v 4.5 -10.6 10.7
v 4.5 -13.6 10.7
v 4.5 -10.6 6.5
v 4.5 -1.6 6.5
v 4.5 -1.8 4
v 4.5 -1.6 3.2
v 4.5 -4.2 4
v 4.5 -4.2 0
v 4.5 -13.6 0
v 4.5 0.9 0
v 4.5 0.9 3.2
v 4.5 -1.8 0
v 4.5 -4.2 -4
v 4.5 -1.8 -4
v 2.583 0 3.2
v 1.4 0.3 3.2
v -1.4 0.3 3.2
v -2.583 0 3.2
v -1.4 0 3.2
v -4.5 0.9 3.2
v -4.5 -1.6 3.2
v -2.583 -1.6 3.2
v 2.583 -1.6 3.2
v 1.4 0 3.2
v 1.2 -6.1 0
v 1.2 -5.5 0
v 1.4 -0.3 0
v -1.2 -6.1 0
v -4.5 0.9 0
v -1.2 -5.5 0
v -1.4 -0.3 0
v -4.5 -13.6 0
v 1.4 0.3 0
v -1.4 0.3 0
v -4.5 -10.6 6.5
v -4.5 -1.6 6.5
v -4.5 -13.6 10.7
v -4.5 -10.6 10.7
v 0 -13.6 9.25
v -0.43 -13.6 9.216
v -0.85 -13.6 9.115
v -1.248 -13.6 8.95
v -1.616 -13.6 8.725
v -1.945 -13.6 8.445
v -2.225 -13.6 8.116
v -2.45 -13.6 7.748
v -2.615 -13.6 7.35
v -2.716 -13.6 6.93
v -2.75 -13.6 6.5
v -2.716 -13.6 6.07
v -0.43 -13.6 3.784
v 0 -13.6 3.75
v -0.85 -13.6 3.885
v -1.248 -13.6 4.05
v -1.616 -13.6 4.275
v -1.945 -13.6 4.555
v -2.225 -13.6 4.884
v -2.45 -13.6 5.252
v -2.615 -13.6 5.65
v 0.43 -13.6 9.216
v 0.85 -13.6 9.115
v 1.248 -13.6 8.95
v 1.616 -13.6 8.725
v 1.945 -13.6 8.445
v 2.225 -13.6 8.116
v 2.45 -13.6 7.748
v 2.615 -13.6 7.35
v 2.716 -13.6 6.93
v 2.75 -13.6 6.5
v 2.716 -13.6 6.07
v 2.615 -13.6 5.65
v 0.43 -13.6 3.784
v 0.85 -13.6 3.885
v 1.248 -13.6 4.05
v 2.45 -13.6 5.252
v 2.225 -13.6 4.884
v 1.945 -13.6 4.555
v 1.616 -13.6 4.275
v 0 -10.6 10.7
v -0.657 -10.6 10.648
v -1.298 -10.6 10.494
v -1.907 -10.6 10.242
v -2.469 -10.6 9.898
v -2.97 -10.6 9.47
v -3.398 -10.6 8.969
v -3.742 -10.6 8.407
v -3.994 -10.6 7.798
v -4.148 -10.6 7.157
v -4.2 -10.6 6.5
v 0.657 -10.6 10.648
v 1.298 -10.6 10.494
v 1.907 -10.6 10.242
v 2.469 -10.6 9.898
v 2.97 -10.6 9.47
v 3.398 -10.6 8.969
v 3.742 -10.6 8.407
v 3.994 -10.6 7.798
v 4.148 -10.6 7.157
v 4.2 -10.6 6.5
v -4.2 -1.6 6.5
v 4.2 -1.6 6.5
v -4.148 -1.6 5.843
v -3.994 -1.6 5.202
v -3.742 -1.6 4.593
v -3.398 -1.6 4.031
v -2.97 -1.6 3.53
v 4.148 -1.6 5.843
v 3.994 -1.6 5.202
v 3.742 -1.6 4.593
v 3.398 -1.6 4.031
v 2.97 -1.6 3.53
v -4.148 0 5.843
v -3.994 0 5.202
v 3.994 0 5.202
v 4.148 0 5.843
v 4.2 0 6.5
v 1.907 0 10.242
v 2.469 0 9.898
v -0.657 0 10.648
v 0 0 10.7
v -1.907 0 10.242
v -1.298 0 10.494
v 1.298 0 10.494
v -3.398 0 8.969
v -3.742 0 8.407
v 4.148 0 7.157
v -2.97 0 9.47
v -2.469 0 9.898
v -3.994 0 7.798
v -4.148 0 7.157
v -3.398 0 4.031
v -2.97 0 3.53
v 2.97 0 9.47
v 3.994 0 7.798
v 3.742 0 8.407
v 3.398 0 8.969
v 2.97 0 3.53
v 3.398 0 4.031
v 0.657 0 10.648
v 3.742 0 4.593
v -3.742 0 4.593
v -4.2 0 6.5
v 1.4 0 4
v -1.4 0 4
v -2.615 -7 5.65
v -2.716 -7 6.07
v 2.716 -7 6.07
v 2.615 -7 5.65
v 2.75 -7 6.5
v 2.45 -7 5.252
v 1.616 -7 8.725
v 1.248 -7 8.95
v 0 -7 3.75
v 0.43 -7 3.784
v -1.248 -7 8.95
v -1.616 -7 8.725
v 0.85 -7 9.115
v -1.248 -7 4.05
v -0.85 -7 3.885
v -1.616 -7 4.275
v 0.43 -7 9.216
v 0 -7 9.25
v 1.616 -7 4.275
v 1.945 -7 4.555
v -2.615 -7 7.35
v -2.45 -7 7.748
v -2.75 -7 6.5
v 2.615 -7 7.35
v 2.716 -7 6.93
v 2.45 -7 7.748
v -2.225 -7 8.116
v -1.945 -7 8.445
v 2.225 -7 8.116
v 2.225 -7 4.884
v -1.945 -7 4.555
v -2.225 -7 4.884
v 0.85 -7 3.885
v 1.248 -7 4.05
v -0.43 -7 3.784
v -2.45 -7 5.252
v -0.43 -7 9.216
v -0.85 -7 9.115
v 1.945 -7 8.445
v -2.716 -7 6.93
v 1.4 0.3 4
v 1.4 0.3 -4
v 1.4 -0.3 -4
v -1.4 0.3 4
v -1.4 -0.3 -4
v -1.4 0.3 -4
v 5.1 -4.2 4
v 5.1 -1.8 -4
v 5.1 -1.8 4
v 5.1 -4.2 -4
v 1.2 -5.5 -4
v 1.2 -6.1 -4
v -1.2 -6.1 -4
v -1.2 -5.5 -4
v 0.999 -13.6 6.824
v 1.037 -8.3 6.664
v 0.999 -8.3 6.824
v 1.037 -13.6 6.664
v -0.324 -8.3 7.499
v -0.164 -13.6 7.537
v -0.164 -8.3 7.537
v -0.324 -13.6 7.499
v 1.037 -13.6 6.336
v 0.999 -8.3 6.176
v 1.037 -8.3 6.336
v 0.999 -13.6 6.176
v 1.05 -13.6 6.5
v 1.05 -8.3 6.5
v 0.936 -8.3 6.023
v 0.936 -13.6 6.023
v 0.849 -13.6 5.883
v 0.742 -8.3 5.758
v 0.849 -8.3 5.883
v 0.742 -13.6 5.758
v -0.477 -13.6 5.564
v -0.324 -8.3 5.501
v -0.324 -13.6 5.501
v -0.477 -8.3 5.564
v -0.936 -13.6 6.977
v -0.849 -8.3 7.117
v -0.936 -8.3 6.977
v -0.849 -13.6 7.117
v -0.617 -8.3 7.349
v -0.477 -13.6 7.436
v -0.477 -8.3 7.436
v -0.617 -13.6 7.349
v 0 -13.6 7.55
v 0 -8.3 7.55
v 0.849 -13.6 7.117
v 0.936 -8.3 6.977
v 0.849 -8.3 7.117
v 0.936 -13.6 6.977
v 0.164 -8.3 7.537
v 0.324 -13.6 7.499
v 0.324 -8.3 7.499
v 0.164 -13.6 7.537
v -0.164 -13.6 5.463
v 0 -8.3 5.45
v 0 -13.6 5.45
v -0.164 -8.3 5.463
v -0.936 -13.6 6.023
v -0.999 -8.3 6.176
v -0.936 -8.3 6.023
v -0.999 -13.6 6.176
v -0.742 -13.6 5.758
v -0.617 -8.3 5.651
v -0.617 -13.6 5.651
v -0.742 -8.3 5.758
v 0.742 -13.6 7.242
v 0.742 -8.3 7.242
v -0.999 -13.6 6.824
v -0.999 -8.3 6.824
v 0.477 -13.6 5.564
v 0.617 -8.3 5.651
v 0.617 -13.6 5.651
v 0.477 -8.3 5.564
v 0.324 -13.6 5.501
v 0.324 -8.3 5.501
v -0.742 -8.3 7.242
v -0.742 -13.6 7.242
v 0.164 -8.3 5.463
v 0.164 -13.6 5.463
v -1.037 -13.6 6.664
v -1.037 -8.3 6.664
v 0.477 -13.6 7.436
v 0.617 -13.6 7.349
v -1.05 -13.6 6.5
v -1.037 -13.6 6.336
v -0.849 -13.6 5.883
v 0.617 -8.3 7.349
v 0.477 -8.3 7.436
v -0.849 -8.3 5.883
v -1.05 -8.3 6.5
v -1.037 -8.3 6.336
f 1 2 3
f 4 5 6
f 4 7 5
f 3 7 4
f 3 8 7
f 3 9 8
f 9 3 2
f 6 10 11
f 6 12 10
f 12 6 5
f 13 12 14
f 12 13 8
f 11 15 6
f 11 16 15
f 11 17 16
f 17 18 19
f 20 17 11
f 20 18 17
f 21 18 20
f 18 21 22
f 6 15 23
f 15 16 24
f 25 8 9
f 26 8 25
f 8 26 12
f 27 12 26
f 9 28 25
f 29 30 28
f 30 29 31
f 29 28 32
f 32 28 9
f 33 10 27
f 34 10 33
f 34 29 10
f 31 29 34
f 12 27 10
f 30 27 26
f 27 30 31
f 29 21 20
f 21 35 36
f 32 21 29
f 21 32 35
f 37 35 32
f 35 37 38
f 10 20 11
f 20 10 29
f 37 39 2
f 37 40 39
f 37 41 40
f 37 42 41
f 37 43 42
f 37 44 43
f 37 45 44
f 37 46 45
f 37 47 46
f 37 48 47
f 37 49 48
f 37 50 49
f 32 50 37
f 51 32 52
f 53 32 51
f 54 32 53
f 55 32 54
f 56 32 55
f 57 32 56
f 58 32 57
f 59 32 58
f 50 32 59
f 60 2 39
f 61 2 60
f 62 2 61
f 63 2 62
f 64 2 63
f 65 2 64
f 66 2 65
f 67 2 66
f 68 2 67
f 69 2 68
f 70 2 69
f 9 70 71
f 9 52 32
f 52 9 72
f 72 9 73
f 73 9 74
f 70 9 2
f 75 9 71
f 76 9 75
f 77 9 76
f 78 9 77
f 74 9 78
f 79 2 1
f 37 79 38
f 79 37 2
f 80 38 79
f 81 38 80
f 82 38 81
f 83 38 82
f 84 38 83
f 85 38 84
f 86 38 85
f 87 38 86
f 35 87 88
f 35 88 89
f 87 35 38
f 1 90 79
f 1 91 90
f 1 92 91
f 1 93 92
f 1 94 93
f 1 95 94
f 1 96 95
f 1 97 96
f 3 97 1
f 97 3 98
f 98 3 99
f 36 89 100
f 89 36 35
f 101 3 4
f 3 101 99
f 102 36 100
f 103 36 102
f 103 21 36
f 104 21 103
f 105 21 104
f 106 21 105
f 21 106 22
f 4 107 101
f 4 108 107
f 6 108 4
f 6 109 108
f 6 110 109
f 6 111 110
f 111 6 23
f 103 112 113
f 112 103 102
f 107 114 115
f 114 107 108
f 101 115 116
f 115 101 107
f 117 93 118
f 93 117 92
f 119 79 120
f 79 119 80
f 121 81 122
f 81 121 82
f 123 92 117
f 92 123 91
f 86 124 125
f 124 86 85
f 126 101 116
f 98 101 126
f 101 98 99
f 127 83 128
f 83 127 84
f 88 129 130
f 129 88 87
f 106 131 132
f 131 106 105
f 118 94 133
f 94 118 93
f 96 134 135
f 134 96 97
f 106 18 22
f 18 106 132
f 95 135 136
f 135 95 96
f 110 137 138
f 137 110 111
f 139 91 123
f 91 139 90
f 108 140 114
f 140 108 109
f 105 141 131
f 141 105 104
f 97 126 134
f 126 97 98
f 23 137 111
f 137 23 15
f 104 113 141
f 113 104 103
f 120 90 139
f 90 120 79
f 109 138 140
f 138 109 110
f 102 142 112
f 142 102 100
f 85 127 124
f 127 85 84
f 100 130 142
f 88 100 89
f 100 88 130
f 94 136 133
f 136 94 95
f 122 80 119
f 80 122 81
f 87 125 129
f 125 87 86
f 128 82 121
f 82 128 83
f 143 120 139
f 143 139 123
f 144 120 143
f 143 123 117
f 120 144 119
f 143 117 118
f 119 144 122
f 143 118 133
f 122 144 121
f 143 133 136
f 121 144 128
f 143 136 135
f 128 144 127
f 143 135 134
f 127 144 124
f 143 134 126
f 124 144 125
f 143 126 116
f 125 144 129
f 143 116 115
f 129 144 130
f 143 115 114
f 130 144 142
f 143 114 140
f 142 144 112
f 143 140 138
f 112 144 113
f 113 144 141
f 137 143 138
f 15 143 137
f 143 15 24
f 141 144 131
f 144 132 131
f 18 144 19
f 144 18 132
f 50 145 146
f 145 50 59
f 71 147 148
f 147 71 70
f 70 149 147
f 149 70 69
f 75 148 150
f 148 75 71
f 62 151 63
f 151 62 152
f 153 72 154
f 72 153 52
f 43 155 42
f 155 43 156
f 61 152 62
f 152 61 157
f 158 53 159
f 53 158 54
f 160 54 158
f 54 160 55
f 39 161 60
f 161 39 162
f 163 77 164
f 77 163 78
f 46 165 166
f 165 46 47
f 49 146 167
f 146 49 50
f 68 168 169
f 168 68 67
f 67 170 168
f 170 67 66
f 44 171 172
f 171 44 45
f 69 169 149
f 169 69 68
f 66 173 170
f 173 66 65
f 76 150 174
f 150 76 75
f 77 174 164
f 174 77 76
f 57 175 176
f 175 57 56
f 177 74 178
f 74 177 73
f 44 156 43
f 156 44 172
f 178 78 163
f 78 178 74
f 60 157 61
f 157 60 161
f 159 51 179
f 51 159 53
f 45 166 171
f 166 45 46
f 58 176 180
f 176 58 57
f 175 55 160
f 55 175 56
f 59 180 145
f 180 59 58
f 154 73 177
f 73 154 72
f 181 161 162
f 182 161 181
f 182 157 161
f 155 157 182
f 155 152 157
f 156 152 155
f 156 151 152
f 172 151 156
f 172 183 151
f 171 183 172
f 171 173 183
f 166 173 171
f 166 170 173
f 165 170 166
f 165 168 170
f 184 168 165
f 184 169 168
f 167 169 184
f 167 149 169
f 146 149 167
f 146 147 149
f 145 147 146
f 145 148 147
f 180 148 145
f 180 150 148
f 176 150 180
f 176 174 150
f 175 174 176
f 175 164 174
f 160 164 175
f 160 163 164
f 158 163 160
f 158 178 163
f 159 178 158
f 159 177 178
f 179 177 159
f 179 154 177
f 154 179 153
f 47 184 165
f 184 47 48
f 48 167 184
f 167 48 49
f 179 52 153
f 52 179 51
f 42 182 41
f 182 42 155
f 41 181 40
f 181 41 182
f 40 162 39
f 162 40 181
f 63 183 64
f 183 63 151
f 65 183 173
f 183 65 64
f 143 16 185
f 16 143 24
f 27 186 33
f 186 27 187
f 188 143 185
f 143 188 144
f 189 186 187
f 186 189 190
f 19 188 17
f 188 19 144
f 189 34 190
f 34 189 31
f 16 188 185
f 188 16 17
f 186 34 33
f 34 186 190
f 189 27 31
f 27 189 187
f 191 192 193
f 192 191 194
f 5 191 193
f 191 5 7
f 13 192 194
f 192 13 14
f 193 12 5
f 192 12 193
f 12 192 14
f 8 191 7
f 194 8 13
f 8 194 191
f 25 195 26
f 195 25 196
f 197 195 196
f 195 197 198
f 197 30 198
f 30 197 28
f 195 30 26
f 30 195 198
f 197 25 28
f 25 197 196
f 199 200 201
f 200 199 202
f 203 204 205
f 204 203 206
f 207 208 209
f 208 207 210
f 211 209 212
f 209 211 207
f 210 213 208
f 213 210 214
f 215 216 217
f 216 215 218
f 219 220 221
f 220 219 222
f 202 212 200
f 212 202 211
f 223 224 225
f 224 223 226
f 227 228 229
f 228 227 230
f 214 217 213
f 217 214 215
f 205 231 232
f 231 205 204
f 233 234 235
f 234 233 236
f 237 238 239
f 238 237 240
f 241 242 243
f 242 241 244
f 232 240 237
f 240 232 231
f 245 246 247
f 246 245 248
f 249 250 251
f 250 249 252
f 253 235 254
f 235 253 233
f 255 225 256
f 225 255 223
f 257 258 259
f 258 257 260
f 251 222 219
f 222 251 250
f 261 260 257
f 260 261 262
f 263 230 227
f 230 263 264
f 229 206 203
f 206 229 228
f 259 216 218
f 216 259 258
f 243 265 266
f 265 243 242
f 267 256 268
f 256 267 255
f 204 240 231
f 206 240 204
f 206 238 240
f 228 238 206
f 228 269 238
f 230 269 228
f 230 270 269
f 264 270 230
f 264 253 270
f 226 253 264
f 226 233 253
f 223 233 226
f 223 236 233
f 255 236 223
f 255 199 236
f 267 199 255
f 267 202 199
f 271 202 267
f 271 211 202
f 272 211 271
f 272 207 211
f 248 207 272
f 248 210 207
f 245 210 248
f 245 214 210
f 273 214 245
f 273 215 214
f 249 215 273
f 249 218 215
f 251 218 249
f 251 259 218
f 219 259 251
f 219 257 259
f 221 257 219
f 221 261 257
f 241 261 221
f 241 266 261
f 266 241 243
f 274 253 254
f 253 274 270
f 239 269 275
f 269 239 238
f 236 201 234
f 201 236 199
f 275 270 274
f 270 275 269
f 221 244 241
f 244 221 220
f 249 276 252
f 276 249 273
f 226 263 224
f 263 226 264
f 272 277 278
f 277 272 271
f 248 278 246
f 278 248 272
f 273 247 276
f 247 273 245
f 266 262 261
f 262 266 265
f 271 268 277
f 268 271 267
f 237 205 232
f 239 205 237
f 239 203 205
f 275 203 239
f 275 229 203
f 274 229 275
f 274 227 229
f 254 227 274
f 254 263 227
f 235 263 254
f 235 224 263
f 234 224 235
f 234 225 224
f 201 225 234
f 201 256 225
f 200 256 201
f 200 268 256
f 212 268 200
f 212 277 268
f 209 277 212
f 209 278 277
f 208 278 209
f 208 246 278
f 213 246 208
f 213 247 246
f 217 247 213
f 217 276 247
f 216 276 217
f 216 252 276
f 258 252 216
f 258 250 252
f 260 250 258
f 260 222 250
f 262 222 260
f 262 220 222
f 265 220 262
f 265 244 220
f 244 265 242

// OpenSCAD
$fn=40;

black = [0.2,0.2,0.2];
silver = [0.75,0.75,0.75];

module pin(pos, size)
{
    translate(pos) cube(concat(size,8), center=true);
}

module legs()
{
	// The model is centered on the back pin
	pin([  0,  0],   [2.8, 0.6]);
	pin([4.8, -3],   [0.6, 2.4]);
	pin([  0, -5.8], [2.4, 0.6]);
}
	
module body()
{
    translate([-4.5, -13.6, 0])
	cube([9, 14.5, 3.2]);
    translate([-4.5, -13.6, 0])
	cube([9, 3, 10.7]);
    translate([-4.5, -13.6, 0])
	cube([9, 12, 6.5]);
    translate([0, -13.6, 6.5]) rotate([-90,0,0])
	cylinder(13.6, d=8.4);
}

module hole()
{
    translate([0, -14, 6.5]) rotate([-90,0,0])
	cylinder(7, d=5.5);
}

module housing()
{
    difference() {
	body();
	hole();
    }
}

module center_pin()
{
    translate([0, -13.6, 6.5]) rotate([-90,0,0])
	cylinder(5.3, d=2.1);
}

module dc_jack()
{
    color(black) housing();
    color(silver) {
	legs();
	center_pin();
    }
}

dc_jack();
